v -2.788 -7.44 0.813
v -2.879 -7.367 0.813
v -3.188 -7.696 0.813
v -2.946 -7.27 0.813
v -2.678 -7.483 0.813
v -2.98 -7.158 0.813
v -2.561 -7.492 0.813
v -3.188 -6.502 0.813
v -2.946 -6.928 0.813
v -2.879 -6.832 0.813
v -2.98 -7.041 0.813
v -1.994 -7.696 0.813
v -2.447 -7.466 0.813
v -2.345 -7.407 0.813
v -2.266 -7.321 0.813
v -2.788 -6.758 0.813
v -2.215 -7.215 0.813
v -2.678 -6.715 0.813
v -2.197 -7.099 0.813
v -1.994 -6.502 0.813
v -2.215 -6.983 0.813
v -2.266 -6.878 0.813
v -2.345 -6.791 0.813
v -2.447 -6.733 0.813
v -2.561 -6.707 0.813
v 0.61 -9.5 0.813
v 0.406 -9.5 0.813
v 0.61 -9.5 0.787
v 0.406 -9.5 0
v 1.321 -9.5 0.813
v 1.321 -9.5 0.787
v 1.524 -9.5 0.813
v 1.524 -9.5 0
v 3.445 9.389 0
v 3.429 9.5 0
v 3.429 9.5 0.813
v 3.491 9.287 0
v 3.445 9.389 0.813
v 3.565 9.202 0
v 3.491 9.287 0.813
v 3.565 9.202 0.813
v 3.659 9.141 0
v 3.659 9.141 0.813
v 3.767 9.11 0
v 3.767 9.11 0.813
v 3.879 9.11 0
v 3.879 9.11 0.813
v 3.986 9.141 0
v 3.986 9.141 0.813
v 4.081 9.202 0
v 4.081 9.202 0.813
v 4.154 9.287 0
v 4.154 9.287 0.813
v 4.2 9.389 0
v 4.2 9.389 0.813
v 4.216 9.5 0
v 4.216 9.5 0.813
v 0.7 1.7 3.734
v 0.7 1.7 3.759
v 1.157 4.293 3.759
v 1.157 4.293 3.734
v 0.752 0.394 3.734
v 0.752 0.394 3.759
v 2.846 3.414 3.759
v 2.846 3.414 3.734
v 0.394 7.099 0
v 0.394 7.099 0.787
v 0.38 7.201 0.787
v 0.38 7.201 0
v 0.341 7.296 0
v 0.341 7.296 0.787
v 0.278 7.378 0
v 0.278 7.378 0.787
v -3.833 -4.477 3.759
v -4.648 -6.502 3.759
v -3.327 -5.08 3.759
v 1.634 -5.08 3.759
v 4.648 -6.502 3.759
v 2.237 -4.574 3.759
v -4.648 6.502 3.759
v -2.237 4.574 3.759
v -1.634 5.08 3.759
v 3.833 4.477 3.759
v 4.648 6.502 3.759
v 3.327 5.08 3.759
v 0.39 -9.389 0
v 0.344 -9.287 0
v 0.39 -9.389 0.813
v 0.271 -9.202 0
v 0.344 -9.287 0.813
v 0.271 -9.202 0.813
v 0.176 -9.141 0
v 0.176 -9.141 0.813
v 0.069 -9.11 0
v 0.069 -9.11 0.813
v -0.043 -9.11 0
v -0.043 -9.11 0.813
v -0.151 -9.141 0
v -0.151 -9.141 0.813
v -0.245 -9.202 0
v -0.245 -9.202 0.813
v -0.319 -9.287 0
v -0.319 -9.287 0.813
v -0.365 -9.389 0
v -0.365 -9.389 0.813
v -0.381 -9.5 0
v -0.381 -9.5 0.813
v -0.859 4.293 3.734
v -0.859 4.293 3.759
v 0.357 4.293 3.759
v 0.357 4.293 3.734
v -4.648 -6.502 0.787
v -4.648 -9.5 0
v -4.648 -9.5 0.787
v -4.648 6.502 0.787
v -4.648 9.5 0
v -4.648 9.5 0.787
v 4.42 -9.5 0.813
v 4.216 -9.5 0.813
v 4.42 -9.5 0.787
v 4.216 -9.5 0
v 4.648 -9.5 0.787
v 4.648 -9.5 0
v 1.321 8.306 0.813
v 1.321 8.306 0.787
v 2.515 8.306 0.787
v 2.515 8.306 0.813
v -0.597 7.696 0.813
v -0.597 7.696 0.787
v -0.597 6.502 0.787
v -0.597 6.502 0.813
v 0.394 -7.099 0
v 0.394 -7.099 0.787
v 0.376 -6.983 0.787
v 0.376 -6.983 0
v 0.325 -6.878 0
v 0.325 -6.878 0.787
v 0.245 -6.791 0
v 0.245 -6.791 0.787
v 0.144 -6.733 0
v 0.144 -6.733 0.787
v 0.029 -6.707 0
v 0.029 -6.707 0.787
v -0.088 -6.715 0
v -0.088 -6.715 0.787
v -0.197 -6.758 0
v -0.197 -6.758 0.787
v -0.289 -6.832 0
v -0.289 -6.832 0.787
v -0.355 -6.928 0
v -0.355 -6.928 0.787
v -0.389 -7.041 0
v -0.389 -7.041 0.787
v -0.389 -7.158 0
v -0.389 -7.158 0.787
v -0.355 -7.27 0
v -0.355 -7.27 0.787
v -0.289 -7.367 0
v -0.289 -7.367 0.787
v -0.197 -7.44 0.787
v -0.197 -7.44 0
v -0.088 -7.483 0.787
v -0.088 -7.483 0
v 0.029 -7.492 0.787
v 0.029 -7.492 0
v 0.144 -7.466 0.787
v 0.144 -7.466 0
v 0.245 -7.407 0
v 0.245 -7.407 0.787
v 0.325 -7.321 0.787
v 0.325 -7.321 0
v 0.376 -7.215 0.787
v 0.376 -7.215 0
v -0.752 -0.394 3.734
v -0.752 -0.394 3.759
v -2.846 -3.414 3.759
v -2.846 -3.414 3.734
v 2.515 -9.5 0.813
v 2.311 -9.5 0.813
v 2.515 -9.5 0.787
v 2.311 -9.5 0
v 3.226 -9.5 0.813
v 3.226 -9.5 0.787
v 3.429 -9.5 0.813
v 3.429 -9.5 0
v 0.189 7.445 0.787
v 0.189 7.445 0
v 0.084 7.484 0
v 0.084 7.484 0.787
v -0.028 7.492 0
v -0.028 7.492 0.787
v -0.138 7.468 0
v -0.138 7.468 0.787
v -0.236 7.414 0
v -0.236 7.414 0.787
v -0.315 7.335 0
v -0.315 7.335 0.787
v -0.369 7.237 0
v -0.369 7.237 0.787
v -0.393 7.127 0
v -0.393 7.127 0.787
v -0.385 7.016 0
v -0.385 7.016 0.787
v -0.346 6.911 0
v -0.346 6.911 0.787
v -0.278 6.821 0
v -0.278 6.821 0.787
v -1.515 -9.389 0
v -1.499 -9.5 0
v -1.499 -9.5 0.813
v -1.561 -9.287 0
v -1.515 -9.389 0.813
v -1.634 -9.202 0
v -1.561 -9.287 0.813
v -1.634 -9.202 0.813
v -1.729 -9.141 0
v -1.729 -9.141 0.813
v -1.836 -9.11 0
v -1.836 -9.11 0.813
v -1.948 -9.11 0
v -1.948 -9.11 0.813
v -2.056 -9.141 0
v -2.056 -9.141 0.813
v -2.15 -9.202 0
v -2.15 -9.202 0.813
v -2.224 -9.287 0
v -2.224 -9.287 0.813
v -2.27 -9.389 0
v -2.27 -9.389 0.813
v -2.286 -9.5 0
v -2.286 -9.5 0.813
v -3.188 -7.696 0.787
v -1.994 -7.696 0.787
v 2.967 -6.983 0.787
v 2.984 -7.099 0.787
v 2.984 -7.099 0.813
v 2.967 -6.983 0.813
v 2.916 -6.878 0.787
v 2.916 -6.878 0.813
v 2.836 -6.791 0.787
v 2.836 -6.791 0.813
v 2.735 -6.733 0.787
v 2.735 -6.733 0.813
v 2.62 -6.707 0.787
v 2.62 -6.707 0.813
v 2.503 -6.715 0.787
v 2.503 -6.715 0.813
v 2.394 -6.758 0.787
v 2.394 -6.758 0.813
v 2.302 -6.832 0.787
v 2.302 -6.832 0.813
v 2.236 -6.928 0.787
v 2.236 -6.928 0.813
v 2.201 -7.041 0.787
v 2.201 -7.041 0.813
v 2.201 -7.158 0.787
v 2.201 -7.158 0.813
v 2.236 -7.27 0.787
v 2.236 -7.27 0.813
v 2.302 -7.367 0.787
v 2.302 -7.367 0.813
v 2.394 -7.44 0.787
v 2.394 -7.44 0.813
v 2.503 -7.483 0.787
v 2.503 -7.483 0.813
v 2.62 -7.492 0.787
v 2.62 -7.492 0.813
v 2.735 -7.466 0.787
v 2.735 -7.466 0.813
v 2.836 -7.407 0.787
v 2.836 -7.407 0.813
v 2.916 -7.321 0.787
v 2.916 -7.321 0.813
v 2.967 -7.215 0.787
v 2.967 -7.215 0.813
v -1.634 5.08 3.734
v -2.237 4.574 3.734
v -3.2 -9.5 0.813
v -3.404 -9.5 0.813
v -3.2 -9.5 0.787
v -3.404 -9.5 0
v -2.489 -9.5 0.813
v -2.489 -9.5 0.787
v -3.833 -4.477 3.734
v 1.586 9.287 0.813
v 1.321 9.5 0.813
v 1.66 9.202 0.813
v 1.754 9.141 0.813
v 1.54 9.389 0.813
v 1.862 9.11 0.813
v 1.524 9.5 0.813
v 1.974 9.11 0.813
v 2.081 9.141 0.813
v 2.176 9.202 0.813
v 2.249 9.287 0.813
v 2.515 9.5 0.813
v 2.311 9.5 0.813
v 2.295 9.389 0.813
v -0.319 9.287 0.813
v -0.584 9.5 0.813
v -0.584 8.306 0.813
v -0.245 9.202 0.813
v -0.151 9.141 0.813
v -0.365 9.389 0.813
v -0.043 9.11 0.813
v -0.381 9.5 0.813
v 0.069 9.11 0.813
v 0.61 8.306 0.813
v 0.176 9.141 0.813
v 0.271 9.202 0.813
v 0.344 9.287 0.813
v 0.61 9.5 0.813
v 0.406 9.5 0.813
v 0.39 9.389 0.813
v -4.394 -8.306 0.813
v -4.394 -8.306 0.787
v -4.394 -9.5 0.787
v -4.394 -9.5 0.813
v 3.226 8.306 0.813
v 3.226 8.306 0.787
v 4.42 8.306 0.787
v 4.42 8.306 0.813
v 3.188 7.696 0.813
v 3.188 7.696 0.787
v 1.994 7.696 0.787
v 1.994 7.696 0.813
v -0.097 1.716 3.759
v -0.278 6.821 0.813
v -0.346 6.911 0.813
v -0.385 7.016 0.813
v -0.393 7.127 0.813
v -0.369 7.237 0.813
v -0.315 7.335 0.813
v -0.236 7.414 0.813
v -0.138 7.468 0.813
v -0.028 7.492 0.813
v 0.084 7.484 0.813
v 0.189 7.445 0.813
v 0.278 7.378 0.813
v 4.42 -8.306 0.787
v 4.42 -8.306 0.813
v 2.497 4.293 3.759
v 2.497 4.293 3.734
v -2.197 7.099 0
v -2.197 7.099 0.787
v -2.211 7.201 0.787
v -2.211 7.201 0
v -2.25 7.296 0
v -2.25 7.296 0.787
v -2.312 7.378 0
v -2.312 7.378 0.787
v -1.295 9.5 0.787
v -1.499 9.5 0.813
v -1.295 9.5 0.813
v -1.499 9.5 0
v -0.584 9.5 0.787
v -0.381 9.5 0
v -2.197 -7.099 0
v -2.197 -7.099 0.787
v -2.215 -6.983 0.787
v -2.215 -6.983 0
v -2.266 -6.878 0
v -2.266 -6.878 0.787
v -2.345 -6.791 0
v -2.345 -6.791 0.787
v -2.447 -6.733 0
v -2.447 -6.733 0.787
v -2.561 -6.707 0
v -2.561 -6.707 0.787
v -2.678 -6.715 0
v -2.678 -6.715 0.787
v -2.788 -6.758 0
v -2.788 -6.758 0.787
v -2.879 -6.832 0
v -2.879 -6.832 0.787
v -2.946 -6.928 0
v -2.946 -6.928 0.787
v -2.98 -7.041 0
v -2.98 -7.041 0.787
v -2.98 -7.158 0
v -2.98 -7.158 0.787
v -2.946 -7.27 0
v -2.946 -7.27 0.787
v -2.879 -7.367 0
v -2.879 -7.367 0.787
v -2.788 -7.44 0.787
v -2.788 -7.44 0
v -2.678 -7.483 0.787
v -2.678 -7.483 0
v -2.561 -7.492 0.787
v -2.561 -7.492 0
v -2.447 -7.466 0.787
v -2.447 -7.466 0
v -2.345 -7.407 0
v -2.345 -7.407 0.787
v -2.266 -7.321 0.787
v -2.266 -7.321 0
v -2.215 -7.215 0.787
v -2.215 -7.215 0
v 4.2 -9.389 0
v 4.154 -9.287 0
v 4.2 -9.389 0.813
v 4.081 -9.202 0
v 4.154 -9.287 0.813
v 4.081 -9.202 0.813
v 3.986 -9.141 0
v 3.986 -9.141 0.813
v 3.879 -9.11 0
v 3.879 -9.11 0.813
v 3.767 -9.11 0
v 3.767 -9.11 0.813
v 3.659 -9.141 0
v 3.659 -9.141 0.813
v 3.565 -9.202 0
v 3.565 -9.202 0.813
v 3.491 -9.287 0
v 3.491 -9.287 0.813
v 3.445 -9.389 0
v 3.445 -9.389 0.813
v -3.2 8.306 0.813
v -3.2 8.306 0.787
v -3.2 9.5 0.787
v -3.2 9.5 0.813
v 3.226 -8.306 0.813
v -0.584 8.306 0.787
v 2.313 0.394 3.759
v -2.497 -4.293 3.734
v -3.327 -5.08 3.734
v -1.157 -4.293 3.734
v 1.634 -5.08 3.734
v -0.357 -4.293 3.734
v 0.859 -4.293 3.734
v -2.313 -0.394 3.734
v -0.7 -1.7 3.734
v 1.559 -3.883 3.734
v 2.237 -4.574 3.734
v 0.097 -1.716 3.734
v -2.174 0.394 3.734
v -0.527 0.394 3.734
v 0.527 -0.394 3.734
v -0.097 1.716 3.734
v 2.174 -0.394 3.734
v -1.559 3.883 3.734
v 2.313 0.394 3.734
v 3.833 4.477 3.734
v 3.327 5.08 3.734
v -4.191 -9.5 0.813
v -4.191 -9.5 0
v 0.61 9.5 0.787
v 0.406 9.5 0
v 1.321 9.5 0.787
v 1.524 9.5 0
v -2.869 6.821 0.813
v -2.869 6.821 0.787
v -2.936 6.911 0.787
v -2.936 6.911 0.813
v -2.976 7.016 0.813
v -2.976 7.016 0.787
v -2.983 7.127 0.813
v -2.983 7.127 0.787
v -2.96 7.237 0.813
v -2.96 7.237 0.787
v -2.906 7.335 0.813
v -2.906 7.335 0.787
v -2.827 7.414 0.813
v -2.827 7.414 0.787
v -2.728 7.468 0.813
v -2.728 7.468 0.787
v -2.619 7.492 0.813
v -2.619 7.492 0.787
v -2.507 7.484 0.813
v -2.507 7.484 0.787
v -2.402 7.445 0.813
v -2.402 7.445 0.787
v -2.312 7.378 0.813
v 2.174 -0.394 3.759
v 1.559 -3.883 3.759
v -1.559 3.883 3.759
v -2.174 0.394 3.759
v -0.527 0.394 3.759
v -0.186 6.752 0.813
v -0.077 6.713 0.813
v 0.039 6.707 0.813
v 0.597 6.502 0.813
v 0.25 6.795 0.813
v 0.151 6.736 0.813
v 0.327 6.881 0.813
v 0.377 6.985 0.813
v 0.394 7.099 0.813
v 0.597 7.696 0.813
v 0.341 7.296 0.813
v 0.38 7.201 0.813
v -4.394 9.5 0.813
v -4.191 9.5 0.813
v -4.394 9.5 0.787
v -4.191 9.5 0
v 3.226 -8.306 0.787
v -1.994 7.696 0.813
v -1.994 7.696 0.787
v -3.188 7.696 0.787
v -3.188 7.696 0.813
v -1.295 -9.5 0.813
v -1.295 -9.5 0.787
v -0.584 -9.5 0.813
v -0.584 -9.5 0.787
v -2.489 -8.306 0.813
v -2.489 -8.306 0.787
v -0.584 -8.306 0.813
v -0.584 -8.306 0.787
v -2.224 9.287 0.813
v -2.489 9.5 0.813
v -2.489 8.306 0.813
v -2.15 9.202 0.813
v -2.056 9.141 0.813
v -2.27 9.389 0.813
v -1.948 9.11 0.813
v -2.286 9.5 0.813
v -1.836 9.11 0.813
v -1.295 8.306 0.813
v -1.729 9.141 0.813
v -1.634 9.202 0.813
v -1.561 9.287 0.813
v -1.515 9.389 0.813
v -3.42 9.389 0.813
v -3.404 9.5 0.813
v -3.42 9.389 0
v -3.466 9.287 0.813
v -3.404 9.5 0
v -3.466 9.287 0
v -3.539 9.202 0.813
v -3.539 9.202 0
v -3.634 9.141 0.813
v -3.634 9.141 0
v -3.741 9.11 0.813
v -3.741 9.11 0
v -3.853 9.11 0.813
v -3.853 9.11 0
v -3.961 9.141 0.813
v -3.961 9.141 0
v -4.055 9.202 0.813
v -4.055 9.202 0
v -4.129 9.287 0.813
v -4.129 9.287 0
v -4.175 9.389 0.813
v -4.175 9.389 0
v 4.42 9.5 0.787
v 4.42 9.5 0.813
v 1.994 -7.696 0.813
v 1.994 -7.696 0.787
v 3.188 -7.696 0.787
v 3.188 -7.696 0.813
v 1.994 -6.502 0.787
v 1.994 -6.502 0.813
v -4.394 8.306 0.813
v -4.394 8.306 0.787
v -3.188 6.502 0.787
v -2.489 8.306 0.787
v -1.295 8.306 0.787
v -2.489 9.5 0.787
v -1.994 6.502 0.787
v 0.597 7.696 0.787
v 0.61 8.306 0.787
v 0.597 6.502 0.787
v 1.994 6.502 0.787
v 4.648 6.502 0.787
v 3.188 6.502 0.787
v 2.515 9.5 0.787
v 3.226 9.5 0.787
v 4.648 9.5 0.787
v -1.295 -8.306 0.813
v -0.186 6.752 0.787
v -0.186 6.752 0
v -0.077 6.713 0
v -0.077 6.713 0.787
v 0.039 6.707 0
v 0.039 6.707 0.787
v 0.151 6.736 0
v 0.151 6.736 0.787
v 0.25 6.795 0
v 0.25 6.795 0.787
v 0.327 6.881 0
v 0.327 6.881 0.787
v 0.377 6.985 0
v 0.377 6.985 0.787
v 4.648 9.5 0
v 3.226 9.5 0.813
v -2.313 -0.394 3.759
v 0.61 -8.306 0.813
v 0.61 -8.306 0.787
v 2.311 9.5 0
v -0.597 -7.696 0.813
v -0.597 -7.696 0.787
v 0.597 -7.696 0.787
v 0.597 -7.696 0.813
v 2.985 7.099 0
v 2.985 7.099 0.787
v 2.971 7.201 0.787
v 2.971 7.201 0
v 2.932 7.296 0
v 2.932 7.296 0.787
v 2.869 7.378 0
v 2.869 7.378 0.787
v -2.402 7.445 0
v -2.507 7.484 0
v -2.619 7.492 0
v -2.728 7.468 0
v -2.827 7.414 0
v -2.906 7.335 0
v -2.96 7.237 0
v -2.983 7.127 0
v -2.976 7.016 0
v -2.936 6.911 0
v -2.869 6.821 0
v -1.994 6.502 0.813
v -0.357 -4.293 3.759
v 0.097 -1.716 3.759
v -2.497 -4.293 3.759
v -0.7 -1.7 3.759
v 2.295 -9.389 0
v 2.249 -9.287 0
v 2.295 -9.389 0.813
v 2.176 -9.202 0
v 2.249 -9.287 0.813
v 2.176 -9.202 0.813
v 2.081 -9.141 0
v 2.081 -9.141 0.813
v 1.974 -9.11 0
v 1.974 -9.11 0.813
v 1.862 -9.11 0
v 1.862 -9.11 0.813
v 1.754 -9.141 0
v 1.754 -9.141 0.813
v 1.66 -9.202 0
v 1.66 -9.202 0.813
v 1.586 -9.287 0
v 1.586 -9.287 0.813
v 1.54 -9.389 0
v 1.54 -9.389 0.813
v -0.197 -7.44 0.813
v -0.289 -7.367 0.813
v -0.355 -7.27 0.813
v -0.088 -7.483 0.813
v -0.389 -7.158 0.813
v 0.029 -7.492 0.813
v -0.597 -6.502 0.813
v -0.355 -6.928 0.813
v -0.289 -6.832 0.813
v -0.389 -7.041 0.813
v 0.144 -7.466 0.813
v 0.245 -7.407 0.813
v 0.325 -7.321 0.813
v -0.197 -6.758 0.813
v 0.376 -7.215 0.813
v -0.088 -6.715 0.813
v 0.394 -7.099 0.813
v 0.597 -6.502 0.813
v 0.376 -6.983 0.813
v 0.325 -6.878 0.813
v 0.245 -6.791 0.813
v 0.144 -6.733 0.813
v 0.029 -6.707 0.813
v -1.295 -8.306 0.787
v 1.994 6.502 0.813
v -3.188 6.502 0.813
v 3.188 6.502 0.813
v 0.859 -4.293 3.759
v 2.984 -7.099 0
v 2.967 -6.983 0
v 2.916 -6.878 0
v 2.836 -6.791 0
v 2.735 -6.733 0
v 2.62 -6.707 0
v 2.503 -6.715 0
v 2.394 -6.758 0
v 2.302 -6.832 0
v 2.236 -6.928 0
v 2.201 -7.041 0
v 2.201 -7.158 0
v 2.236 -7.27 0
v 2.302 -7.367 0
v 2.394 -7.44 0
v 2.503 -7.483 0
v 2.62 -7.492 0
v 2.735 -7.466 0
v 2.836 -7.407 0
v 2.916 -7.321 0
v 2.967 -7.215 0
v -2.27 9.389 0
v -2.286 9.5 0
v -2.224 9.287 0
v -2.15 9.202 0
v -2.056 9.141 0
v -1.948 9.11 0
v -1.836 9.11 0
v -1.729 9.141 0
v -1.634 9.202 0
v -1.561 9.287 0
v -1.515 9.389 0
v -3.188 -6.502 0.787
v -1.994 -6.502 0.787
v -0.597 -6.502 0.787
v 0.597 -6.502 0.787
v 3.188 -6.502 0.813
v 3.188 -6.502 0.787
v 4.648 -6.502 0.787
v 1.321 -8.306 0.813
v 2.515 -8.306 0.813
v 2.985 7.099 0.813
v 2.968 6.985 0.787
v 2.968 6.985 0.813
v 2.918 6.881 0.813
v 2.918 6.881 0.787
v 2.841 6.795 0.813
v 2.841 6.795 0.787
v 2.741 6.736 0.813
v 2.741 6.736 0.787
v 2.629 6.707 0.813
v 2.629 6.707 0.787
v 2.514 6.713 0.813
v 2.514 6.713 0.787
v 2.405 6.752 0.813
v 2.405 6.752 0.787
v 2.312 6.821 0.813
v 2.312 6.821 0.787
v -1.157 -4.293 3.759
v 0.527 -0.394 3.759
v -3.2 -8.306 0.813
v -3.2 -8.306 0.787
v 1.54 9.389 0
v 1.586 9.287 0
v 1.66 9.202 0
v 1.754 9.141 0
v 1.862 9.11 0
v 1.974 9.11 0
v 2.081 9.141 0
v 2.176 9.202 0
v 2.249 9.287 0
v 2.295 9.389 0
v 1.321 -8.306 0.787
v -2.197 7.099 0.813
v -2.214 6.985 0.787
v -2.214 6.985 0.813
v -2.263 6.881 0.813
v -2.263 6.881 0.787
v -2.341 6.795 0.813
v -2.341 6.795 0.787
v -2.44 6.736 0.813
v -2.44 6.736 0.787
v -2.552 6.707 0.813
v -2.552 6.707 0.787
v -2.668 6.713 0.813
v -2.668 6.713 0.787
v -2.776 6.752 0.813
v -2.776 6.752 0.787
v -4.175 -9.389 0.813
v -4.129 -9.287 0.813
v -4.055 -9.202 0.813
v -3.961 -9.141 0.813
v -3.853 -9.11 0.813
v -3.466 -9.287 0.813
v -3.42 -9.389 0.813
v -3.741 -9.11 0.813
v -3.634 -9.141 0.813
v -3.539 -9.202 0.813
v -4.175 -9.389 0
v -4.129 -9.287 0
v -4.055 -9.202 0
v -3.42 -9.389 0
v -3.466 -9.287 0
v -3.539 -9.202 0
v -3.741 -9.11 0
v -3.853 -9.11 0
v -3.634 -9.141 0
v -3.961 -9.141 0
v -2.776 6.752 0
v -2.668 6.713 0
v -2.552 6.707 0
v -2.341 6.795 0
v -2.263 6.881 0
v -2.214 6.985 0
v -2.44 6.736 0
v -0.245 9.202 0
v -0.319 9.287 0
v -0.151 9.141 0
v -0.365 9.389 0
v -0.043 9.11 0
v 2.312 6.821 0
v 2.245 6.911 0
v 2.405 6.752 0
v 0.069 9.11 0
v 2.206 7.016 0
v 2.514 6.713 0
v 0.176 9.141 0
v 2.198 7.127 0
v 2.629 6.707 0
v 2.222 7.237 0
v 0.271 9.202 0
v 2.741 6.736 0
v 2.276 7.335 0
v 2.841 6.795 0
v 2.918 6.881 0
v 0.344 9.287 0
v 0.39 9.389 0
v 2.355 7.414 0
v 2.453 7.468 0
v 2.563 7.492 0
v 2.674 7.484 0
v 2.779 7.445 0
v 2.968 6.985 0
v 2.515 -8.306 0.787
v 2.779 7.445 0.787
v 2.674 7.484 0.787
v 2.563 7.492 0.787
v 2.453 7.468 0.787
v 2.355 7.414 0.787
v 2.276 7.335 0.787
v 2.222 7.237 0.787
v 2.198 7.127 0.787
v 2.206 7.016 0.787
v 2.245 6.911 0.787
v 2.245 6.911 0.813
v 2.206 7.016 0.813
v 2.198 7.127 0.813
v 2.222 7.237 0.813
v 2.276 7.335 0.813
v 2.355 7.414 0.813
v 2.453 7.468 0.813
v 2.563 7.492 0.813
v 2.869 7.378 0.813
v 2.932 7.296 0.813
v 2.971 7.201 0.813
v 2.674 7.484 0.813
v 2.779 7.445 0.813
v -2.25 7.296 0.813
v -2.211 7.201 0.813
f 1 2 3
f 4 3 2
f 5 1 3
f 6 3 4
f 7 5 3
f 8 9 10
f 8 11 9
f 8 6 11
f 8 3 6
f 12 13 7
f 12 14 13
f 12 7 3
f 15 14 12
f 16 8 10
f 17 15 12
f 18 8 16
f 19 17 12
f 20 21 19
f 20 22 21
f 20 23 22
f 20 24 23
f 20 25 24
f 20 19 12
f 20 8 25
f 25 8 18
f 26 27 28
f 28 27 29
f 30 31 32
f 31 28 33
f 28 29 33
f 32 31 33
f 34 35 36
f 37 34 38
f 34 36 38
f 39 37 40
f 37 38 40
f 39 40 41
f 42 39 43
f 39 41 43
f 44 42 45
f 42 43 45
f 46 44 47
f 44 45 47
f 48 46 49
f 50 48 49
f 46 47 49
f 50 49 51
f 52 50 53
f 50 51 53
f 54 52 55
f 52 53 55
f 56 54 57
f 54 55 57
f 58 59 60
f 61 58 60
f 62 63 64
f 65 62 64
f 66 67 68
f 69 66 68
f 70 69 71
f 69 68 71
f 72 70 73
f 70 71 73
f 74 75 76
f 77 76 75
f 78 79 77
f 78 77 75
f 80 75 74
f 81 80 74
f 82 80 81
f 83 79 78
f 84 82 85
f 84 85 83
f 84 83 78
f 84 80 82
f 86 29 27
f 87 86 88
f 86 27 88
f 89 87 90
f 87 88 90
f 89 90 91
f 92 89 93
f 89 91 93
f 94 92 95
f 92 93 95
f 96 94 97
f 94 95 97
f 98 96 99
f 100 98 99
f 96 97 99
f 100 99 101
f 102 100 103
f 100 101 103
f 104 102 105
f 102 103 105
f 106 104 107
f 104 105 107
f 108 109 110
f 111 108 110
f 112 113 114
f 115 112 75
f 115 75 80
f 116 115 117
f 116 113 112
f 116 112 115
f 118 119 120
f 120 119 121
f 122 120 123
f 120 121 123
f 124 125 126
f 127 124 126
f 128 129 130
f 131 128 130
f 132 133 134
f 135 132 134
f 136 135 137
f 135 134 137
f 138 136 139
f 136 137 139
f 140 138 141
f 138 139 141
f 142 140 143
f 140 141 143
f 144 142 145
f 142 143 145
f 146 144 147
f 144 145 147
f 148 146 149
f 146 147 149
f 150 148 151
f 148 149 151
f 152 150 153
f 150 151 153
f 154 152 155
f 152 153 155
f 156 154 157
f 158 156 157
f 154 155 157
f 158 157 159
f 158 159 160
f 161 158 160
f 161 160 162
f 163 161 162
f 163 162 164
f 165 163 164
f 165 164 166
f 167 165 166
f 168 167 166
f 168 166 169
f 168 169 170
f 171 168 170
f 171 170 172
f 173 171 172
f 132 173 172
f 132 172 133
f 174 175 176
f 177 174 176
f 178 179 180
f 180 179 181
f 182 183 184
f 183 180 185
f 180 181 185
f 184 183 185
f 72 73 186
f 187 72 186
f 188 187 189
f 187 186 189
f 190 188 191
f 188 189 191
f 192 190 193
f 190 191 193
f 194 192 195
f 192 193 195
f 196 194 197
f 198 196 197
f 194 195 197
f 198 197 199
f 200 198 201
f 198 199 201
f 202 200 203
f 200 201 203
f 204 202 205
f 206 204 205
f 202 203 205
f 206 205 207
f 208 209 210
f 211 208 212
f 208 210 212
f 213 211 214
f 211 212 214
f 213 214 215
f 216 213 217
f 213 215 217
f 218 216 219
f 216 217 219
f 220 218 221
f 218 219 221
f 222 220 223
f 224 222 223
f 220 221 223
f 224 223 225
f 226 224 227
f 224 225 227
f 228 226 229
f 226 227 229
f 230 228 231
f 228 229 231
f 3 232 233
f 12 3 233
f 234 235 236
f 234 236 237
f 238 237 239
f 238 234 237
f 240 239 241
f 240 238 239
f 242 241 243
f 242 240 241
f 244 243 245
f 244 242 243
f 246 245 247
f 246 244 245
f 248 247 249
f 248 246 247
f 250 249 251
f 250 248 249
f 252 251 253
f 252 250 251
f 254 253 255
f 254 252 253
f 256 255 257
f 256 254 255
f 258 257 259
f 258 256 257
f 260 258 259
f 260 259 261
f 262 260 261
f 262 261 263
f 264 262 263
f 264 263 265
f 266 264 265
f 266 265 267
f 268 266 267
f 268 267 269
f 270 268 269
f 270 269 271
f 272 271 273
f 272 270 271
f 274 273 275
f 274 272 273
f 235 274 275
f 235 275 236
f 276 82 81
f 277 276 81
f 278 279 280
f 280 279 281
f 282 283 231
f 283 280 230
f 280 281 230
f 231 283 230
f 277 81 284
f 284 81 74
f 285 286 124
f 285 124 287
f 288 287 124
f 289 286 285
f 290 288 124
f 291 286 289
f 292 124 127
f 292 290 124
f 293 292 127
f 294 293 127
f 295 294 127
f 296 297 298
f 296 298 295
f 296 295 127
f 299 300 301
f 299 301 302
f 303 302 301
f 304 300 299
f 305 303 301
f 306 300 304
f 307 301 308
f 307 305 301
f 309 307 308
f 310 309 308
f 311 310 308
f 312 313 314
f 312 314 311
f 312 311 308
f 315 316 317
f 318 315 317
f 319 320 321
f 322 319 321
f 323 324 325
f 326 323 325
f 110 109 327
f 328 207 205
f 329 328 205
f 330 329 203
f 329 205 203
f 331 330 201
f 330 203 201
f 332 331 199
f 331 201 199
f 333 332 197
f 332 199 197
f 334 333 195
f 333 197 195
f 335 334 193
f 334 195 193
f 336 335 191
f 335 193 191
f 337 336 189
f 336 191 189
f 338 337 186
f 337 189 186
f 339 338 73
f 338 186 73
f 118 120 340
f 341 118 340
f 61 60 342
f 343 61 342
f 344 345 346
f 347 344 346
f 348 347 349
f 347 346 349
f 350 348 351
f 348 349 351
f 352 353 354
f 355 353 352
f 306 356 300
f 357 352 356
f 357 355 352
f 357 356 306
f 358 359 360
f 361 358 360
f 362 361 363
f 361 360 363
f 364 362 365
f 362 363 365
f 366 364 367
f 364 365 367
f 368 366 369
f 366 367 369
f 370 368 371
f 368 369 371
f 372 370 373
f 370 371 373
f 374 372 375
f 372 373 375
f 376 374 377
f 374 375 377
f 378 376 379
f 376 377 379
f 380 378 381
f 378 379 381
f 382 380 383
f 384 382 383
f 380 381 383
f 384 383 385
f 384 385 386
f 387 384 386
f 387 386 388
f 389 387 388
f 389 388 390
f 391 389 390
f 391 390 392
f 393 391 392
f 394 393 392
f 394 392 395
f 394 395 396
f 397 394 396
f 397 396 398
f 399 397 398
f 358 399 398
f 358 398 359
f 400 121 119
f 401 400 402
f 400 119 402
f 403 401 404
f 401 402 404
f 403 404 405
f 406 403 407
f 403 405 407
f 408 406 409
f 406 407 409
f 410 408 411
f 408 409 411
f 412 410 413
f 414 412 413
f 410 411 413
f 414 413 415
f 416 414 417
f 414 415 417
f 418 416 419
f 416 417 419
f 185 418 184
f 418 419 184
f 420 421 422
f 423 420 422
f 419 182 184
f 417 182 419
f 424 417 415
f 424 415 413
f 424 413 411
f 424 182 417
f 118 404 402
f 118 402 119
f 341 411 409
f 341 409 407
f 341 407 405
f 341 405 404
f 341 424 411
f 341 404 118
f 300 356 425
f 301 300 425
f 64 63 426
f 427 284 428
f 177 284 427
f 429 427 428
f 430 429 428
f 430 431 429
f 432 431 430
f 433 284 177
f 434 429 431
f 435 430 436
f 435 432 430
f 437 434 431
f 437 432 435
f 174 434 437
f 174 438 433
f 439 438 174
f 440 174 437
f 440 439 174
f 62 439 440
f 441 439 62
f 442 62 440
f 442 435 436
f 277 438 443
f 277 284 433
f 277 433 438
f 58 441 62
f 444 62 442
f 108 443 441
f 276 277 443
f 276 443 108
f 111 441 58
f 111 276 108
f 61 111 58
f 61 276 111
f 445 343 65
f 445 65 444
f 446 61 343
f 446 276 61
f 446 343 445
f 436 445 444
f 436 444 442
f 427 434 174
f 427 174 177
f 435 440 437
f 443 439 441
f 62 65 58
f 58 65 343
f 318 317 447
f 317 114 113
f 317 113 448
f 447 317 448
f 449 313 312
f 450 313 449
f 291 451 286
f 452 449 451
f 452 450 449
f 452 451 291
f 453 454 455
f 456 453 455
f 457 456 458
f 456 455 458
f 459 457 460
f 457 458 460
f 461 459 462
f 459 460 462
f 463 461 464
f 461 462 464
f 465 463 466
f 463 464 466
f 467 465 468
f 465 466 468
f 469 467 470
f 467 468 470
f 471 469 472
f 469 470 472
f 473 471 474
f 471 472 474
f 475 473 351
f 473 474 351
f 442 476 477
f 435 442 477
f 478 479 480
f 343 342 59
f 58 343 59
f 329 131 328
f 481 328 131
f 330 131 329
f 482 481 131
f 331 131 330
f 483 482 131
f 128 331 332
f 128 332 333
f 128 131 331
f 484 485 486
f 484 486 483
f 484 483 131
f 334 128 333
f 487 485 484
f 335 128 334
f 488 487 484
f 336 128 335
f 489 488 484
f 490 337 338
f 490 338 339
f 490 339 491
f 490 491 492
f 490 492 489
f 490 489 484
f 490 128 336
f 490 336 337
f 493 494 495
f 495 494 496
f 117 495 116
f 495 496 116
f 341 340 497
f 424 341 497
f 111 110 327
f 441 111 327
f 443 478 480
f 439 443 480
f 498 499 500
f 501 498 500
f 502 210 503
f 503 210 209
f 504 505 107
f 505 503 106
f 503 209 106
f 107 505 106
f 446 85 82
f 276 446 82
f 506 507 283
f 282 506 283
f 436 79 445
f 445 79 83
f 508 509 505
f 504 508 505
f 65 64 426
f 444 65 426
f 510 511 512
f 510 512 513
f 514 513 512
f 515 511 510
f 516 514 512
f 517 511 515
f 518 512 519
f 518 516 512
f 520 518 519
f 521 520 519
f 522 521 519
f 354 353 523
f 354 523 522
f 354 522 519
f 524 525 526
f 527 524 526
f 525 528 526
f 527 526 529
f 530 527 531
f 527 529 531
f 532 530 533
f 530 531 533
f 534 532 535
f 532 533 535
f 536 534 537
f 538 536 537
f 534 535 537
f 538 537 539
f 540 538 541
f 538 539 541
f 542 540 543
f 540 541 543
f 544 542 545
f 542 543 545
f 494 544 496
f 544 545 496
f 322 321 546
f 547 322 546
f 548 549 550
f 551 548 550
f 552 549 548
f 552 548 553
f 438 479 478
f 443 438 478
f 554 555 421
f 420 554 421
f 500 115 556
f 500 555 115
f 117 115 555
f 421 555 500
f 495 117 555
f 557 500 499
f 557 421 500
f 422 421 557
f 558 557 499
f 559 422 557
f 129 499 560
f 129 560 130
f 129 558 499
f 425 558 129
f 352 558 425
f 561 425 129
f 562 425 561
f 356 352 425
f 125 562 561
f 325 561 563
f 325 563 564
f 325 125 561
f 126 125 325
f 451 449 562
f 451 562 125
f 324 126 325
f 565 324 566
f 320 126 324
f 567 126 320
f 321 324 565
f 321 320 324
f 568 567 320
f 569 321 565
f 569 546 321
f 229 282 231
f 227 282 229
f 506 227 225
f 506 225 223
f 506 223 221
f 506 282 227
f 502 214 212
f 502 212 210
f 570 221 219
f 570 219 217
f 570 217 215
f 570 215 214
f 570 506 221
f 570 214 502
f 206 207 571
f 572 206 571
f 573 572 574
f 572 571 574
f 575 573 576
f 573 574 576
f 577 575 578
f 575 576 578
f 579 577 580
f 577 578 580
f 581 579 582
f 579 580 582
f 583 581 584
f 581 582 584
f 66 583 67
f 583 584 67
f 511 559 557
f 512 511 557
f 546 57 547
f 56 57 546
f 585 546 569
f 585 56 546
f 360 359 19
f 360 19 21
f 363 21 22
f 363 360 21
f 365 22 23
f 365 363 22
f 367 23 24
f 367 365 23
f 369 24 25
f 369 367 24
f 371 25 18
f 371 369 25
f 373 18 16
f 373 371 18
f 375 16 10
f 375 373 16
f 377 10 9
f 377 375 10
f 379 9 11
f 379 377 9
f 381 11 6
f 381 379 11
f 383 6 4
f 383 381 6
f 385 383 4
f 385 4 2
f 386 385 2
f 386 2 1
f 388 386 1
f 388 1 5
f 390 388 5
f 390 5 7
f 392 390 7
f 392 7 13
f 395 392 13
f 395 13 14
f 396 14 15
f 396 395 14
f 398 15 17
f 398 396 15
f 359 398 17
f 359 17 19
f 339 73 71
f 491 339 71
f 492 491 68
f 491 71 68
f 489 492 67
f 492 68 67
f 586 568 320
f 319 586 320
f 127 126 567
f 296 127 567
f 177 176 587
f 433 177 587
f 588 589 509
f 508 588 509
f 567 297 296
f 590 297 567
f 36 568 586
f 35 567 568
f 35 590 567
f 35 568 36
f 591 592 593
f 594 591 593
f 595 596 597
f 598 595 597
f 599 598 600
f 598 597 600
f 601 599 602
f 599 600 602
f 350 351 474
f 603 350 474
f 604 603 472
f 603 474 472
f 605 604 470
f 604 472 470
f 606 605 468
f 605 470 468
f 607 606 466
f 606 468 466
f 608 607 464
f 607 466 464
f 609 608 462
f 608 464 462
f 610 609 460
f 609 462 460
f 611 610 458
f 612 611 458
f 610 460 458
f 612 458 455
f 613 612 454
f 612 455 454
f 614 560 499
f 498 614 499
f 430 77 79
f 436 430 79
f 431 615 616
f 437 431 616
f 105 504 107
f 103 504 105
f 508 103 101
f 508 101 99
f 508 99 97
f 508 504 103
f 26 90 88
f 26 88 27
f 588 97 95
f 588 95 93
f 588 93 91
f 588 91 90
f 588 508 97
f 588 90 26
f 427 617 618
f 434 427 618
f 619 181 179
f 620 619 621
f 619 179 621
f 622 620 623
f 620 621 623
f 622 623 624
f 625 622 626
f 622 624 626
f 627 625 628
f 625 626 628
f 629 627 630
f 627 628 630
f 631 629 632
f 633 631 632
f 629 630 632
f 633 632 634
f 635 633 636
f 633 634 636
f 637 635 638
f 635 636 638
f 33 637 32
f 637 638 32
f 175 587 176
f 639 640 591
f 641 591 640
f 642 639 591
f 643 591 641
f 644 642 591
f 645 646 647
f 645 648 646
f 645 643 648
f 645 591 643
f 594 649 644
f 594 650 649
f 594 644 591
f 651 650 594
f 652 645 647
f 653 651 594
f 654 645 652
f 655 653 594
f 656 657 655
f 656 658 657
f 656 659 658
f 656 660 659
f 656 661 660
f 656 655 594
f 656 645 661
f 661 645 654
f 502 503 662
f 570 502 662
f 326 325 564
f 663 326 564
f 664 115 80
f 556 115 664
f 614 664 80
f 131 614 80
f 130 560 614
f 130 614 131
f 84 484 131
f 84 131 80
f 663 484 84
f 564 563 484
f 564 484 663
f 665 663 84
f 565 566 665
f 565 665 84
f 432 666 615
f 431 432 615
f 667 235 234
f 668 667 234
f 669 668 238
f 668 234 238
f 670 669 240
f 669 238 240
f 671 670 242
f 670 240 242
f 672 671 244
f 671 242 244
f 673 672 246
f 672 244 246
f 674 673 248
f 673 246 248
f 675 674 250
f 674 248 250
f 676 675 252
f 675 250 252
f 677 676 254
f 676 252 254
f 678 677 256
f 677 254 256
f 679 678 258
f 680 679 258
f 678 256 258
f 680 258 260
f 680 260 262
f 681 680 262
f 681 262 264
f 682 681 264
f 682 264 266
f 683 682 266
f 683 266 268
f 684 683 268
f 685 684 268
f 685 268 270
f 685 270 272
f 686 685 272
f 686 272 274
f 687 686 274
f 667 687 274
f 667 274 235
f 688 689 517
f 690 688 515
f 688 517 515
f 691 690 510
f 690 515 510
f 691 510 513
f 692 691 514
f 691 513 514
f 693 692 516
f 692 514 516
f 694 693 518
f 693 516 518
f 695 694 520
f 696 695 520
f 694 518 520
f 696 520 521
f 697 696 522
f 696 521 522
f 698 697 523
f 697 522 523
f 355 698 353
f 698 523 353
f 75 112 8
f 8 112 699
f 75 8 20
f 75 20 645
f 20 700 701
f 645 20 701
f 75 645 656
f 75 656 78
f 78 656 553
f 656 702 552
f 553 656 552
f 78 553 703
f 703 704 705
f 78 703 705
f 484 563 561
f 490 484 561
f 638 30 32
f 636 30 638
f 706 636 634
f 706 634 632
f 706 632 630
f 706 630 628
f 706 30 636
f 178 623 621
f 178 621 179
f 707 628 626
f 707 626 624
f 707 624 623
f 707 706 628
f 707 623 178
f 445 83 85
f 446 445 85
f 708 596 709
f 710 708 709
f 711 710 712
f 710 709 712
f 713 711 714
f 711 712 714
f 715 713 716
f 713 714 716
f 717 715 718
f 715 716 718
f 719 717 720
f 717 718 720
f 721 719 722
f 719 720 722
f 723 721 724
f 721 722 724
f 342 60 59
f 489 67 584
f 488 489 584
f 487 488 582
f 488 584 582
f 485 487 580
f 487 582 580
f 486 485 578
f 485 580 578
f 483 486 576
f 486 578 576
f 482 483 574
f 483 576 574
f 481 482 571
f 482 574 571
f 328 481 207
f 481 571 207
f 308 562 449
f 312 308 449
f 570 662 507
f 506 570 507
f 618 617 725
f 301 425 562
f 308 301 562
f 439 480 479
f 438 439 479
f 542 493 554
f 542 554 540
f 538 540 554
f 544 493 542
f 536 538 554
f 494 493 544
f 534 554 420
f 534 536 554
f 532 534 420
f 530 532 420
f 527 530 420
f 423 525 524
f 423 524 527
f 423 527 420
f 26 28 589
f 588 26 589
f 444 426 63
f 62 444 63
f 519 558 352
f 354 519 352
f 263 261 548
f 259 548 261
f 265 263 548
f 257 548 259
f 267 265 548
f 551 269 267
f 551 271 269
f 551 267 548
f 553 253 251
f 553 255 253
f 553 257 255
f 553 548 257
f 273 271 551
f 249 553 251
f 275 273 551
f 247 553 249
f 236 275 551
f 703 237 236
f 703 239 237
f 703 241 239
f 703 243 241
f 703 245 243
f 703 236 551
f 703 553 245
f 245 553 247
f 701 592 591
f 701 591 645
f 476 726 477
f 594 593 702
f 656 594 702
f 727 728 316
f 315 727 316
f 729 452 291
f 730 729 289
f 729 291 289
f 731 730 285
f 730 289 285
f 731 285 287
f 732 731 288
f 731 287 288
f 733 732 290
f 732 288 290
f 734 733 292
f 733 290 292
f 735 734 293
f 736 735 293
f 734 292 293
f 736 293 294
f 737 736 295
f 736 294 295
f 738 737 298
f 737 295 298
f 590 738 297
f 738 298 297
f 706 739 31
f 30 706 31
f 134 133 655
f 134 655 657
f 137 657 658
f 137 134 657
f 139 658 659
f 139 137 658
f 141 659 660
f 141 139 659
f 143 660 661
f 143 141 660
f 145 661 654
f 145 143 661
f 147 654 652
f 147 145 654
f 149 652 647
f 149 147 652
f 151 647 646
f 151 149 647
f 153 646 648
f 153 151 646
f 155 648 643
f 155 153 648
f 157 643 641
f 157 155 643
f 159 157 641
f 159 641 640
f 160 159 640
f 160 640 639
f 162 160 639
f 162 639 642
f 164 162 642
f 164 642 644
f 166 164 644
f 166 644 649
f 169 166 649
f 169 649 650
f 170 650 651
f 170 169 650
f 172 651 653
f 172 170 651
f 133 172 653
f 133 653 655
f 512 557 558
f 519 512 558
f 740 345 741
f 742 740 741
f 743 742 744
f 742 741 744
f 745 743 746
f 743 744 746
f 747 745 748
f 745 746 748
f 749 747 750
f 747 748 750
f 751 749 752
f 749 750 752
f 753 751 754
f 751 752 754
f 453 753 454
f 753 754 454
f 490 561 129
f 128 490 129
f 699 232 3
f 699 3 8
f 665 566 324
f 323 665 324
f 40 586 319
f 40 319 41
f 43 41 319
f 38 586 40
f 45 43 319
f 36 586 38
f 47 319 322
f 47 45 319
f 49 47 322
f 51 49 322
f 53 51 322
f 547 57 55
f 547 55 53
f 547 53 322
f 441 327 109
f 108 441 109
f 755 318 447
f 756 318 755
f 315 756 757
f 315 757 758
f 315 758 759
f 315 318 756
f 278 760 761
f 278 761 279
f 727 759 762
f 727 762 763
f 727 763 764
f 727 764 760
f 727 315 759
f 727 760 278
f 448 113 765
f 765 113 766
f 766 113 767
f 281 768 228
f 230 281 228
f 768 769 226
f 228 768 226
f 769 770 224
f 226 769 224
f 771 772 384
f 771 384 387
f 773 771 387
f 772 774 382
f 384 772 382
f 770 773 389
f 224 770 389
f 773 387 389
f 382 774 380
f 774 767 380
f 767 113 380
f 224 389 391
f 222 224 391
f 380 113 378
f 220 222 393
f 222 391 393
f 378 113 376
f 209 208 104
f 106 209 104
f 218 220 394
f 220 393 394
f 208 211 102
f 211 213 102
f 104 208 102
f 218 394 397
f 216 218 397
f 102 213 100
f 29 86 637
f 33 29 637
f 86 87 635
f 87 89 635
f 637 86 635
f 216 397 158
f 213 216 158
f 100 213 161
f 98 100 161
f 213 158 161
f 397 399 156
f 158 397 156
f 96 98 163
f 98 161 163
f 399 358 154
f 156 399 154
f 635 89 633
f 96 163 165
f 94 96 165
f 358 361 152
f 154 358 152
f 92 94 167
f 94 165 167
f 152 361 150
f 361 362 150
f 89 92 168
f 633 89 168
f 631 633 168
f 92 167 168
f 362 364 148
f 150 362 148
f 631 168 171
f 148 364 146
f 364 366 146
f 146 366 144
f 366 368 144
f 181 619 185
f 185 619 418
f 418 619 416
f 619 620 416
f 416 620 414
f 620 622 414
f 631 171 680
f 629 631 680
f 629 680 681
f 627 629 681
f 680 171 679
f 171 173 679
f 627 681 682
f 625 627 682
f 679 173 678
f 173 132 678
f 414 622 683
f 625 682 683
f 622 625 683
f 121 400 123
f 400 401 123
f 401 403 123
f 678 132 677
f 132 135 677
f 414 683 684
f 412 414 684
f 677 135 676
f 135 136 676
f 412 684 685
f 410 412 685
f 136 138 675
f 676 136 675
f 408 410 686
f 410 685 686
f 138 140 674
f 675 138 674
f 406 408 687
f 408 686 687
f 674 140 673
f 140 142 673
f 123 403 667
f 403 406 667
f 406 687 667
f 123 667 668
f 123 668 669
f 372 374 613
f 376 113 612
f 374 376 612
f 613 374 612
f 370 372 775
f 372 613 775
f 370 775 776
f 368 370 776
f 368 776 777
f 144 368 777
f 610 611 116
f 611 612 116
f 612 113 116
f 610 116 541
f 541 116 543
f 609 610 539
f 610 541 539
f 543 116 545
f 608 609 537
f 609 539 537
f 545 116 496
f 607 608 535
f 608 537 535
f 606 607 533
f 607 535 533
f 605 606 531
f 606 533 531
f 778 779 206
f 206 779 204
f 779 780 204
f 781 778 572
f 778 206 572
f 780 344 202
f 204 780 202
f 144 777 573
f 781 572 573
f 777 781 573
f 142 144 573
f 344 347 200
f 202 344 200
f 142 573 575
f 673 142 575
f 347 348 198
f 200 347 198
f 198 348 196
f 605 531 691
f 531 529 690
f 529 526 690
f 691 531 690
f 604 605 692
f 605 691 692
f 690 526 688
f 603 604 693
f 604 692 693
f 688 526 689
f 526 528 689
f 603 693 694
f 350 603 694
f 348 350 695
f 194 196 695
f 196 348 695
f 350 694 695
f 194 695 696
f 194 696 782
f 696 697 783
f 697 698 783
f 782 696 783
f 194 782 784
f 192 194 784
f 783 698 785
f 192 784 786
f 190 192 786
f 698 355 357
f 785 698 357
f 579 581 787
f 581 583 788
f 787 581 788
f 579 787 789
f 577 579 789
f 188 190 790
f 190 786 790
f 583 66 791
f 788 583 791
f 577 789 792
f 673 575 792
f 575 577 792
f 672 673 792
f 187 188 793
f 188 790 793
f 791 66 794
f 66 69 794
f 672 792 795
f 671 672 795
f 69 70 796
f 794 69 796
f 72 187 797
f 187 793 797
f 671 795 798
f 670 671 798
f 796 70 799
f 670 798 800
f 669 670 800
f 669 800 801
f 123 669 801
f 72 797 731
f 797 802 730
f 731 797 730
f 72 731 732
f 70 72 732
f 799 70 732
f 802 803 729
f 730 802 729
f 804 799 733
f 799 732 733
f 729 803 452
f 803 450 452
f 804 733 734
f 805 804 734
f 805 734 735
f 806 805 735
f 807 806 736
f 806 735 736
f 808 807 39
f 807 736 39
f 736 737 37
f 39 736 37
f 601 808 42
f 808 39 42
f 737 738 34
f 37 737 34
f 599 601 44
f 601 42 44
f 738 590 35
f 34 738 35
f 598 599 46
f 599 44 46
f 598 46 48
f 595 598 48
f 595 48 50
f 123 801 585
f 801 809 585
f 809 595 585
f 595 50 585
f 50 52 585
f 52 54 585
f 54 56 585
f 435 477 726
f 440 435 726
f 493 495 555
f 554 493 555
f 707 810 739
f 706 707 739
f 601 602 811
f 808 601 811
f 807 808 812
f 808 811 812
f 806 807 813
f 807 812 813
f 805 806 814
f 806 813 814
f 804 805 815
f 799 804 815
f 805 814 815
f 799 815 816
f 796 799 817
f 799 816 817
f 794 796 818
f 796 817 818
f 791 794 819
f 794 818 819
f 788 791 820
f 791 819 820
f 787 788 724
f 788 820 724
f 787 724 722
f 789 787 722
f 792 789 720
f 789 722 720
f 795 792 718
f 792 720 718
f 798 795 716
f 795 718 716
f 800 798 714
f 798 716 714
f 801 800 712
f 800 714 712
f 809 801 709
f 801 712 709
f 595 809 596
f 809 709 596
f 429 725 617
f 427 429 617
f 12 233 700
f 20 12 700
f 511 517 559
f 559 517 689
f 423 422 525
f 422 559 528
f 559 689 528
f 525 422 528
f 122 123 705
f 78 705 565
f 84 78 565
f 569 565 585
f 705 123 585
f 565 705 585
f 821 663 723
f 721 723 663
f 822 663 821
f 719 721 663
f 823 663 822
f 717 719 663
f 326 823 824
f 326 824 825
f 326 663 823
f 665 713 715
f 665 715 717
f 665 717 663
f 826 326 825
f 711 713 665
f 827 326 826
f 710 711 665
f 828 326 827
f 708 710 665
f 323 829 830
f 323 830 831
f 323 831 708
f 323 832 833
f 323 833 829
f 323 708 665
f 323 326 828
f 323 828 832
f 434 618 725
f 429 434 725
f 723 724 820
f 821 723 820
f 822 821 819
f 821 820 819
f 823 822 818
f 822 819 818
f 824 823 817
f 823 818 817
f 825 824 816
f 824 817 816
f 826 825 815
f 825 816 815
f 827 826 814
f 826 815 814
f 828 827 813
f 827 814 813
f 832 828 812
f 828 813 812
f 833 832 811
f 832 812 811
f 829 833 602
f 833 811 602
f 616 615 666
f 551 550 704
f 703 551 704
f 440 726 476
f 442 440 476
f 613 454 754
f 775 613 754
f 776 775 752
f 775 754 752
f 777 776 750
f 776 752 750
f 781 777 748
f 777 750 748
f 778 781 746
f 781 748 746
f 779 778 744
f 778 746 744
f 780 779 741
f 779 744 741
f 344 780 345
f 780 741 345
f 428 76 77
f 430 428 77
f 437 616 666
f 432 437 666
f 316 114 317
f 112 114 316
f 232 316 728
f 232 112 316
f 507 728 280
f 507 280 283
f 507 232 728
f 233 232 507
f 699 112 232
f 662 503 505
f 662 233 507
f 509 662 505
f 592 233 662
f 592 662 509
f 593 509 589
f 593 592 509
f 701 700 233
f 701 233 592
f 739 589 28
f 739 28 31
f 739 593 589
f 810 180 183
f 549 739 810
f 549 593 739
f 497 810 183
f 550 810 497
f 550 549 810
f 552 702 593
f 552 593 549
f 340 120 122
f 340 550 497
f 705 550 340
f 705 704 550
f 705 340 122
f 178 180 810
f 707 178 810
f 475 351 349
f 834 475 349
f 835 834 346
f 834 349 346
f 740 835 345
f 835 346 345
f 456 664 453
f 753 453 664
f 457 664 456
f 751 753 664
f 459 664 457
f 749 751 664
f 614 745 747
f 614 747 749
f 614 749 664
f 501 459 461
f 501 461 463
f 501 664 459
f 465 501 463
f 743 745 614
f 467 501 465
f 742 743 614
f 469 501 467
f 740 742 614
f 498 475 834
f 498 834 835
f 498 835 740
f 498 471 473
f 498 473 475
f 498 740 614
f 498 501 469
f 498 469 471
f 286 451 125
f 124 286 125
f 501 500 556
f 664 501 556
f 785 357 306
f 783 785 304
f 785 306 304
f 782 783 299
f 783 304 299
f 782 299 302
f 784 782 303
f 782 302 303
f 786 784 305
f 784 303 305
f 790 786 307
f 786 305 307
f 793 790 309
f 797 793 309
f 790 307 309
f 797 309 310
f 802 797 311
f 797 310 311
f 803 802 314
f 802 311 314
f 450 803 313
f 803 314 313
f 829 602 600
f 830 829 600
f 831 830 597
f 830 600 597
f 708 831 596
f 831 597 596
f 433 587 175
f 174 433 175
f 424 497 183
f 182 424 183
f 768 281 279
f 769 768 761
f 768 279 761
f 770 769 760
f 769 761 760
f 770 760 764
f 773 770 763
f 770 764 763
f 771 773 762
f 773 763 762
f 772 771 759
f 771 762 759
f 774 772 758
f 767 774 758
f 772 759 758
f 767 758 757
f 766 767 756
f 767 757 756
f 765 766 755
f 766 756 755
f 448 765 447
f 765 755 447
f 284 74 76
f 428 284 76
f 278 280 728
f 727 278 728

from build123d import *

# Parameters (mm, degrees)
F0_W     = 9.2964
F0_H     = 18.9992
F1_DEPTH = 0.7874
F2_W     = 9.2964
F2_H     = 13.0048
F3_DEPTH = 2.9718
F4_R     = 0.3937
F5_DEPTH = 25.4
F4_W     = 1.1938
F4_H     = 1.1938
F6_DEPTH = 0.0254
F8_DEPTH = 0.0254


with BuildPart() as f1:
    # F0 (on Top) → F1 (new body)
    with BuildSketch(Plane.XY):
        Rectangle(F0_W, F0_H)
    extrude(amount=F1_DEPTH)

    # F2 (on face) → F3 (join)
    with BuildSketch(Plane.XY.offset(0.7874)):
        Rectangle(F2_W, F2_H)
    extrude(amount=F3_DEPTH)

    # F4 (on face) → F5 (cut)
    with BuildSketch(Plane.XY.offset(0.7874)):
        with BuildLine():
            ThreePointArc((-3.4036, -9.4996), (-3.7973, -9.1059), (-4.191, -9.4996))
            Line((-4.191, -9.4996), (-3.4036, -9.4996))
        make_face()
        with BuildLine():
            ThreePointArc((-1.4986, -9.4996), (-1.8923, -9.1059), (-2.286, -9.4996))
            Line((-2.286, -9.4996), (-1.4986, -9.4996))
        make_face()
        with BuildLine():
            ThreePointArc((0.4064, -9.4996), (0.0127, -9.1059), (-0.381, -9.4996))
            Line((-0.381, -9.4996), (0.4064, -9.4996))
        make_face()
        with BuildLine():
            ThreePointArc((2.3114, -9.4996), (1.9177, -9.1059), (1.524, -9.4996))
            Line((1.524, -9.4996), (2.3114, -9.4996))
        make_face()
        with BuildLine():
            Line((3.429, -9.4996), (4.2164, -9.4996))
            ThreePointArc((4.2164, -9.4996), (3.8227, -9.1059), (3.429, -9.4996))
        make_face()
        with Locations((2.5908, -7.0993)):
            Circle(F4_R)
        with Locations((0, -7.0993)):
            Circle(F4_R)
        with Locations((-2.5908, -7.0993)):
            Circle(F4_R)
        with BuildLine():
            ThreePointArc((-2.3124120602, 7.3776879398), (-2.8691879398, 7.3776879398), (-2.8691879398, 6.8209120602))
            Line((-2.8691879398, 6.8209120602), (-2.3124120602, 7.3776879398))
        make_face()
        with BuildLine():
            Line((-2.3124120602, 7.3776879398), (-2.8691879398, 6.8209120602))
            ThreePointArc((-2.8691879398, 6.8209120602), (-2.4401375327, 6.7355686281), (-2.1971, 7.0993))
            ThreePointArc((-2.1971, 7.0993), (-2.2270686281, 7.2499624673), (-2.3124120602, 7.3776879398))
        make_face()
        with BuildLine():
            ThreePointArc((0.2783879398, 7.3776879398), (-0.2783879398, 7.3776879398), (-0.2783879398, 6.8209120602))
            Line((-0.2783879398, 6.8209120602), (0.2783879398, 7.3776879398))
        make_face()
        with BuildLine():
            Line((0.2783879398, 7.3776879398), (-0.2783879398, 6.8209120602))
            ThreePointArc((-0.2783879398, 6.8209120602), (0.1506624673, 6.7355686281), (0.3937, 7.0993))
            ThreePointArc((0.3937, 7.0993), (0.3637313719, 7.2499624673), (0.2783879398, 7.3776879398))
        make_face()
        with BuildLine():
            ThreePointArc((2.8691879398, 7.3776879398), (2.3124120602, 7.3776879398), (2.3124120602, 6.8209120602))
            Line((2.3124120602, 6.8209120602), (2.8691879398, 7.3776879398))
        make_face()
        with BuildLine():
            Line((2.8691879398, 7.3776879398), (2.3124120602, 6.8209120602))
            ThreePointArc((2.3124120602, 6.8209120602), (2.7414624673, 6.7355686281), (2.9845, 7.0993))
            ThreePointArc((2.9845, 7.0993), (2.9545313719, 7.2499624673), (2.8691879398, 7.3776879398))
        make_face()
        with BuildLine():
            ThreePointArc((-4.191, 9.4996), (-3.7973, 9.1059), (-3.4036, 9.4996))
            Line((-3.4036, 9.4996), (-4.191, 9.4996))
        make_face()
        with BuildLine():
            ThreePointArc((-2.286, 9.4996), (-1.8923, 9.1059), (-1.4986, 9.4996))
            Line((-1.4986, 9.4996), (-2.286, 9.4996))
        make_face()
        with BuildLine():
            Line((0.4064, 9.4996), (-0.381, 9.4996))
            ThreePointArc((-0.381, 9.4996), (0.0127, 9.1059), (0.4064, 9.4996))
        make_face()
        with BuildLine():
            Line((2.3114, 9.4996), (1.524, 9.4996))
            ThreePointArc((1.524, 9.4996), (1.9177, 9.1059), (2.3114, 9.4996))
        make_face()
        with BuildLine():
            Line((4.2164, 9.4996), (3.429, 9.4996))
            ThreePointArc((3.429, 9.4996), (3.8227, 9.1059), (4.2164, 9.4996))
        make_face()
    extrude(amount=-F5_DEPTH, mode=Mode.SUBTRACT)

    # F4 (on face) → F6 (join)
    with BuildSketch(Plane.XY.offset(0.7874)):
        with BuildLine():
            Line((-4.3942, 8.3058), (-3.2004, 8.3058))
            Line((-3.2004, 8.3058), (-3.2004, 9.4996))
            Line((-3.2004, 9.4996), (-3.4036, 9.4996))
            ThreePointArc((-3.4036, 9.4996), (-3.7973, 9.1059), (-4.191, 9.4996))
            Line((-4.191, 9.4996), (-4.3942, 9.4996))
            Line((-4.3942, 9.4996), (-4.3942, 8.3058))
        make_face()
        with BuildLine():
            Line((-1.2954, 9.4996), (-1.4986, 9.4996))
            ThreePointArc((-1.4986, 9.4996), (-1.8923, 9.1059), (-2.286, 9.4996))
            Line((-2.286, 9.4996), (-2.4892, 9.4996))
            Line((-2.4892, 9.4996), (-2.4892, 8.3058))
            Line((-2.4892, 8.3058), (-1.2954, 8.3058))
            Line((-1.2954, 8.3058), (-1.2954, 9.4996))
        make_face()
        with BuildLine():
            Line((-0.381, 9.4996), (-0.5842, 9.4996))
            Line((-0.5842, 9.4996), (-0.5842, 8.3058))
            Line((-0.5842, 8.3058), (0.6096, 8.3058))
            Line((0.6096, 8.3058), (0.6096, 9.4996))
            Line((0.6096, 9.4996), (0.4064, 9.4996))
            ThreePointArc((0.4064, 9.4996), (0.0127, 9.1059), (-0.381, 9.4996))
        make_face()
        with BuildLine():
            Line((1.524, 9.4996), (1.3208, 9.4996))
            Line((1.3208, 9.4996), (1.3208, 8.3058))
            Line((1.3208, 8.3058), (2.5146, 8.3058))
            Line((2.5146, 8.3058), (2.5146, 9.4996))
            Line((2.5146, 9.4996), (2.3114, 9.4996))
            ThreePointArc((2.3114, 9.4996), (1.9177, 9.1059), (1.524, 9.4996))
        make_face()
        with BuildLine():
            Line((3.429, 9.4996), (3.2258, 9.4996))
            Line((3.2258, 9.4996), (3.2258, 8.3058))
            Line((3.2258, 8.3058), (4.4196, 8.3058))
            Line((4.4196, 8.3058), (4.4196, 9.4996))
            Line((4.4196, 9.4996), (4.2164, 9.4996))
            ThreePointArc((4.2164, 9.4996), (3.8227, 9.1059), (3.429, 9.4996))
        make_face()
        with BuildLine():
            Line((-2.4892, -8.3058), (-2.4892, -9.4996))
            Line((-2.4892, -9.4996), (-2.286, -9.4996))
            ThreePointArc((-2.286, -9.4996), (-1.8923, -9.1059), (-1.4986, -9.4996))
            Line((-1.4986, -9.4996), (-1.2954, -9.4996))
            Line((-1.2954, -9.4996), (-1.2954, -8.3058))
            Line((-1.2954, -8.3058), (-2.4892, -8.3058))
        make_face()
        with BuildLine():
            Line((-4.3942, -8.3058), (-4.3942, -9.4996))
            Line((-4.3942, -9.4996), (-4.191, -9.4996))
            ThreePointArc((-4.191, -9.4996), (-3.7973, -9.1059), (-3.4036, -9.4996))
            Line((-3.4036, -9.4996), (-3.2004, -9.4996))
            Line((-3.2004, -9.4996), (-3.2004, -8.3058))
            Line((-3.2004, -8.3058), (-4.3942, -8.3058))
        make_face()
        with BuildLine():
            Line((-0.5842, -8.3058), (-0.5842, -9.4996))
            Line((-0.5842, -9.4996), (-0.381, -9.4996))
            ThreePointArc((-0.381, -9.4996), (0.0127, -9.1059), (0.4064, -9.4996))
            Line((0.4064, -9.4996), (0.6096, -9.4996))
            Line((0.6096, -9.4996), (0.6096, -8.3058))
            Line((0.6096, -8.3058), (-0.5842, -8.3058))
        make_face()
        with BuildLine():
            Line((1.3208, -8.3058), (1.3208, -9.4996))
            Line((1.3208, -9.4996), (1.524, -9.4996))
            ThreePointArc((1.524, -9.4996), (1.9177, -9.1059), (2.3114, -9.4996))
            Line((2.3114, -9.4996), (2.5146, -9.4996))
            Line((2.5146, -9.4996), (2.5146, -8.3058))
            Line((2.5146, -8.3058), (1.3208, -8.3058))
        make_face()
        with BuildLine():
            Line((4.2164, -9.4996), (4.4196, -9.4996))
            Line((4.4196, -9.4996), (4.4196, -8.3058))
            Line((4.4196, -8.3058), (3.2258, -8.3058))
            Line((3.2258, -8.3058), (3.2258, -9.4996))
            Line((3.2258, -9.4996), (3.429, -9.4996))
            ThreePointArc((3.429, -9.4996), (3.8227, -9.1059), (4.2164, -9.4996))
        make_face()
        with Locations((2.5908, -7.0993)):
            Rectangle(F4_W, F4_H)
        with Locations((2.5908, -7.0993)):
            Circle(F4_R, mode=Mode.SUBTRACT)
        with Locations((0, -7.0993)):
            Rectangle(F4_W, F4_H)
        with Locations((0, -7.0993)):
            Circle(F4_R, mode=Mode.SUBTRACT)
        with Locations((-2.5908, -7.0993)):
            Rectangle(F4_W, F4_H)
        with Locations((-2.5908, -7.0993)):
            Circle(F4_R, mode=Mode.SUBTRACT)
        with BuildLine():
            Line((-2.8691879398, 6.8209120602), (-3.1877, 6.5024))
            Line((-3.1877, 6.5024), (-1.9939, 6.5024))
            Line((-1.9939, 6.5024), (-1.9939, 7.6962))
            Line((-1.9939, 7.6962), (-2.3124120602, 7.3776879398))
            ThreePointArc((-2.3124120602, 7.3776879398), (-2.2270686281, 7.2499624673), (-2.1971, 7.0993))
            ThreePointArc((-2.1971, 7.0993), (-2.4401375327, 6.7355686281), (-2.8691879398, 6.8209120602))
        make_face()
        with BuildLine():
            Line((0.5969, 7.6962), (-0.5969, 7.6962))
            Line((-0.5969, 7.6962), (-0.5969, 6.5024))
            Line((-0.5969, 6.5024), (-0.2783879398, 6.8209120602))
            ThreePointArc((-0.2783879398, 6.8209120602), (-0.2783879398, 7.3776879398), (0.2783879398, 7.3776879398))
            Line((0.2783879398, 7.3776879398), (0.5969, 7.6962))
        make_face()
        with BuildLine():
            Line((-0.2783879398, 6.8209120602), (-0.5969, 6.5024))
            Line((-0.5969, 6.5024), (0.5969, 6.5024))
            Line((0.5969, 6.5024), (0.5969, 7.6962))
            Line((0.5969, 7.6962), (0.2783879398, 7.3776879398))
            ThreePointArc((0.2783879398, 7.3776879398), (0.3637313719, 7.2499624673), (0.3937, 7.0993))
            ThreePointArc((0.3937, 7.0993), (0.1506624673, 6.7355686281), (-0.2783879398, 6.8209120602))
        make_face()
        with BuildLine():
            Line((2.3124120602, 6.8209120602), (1.9939, 6.5024))
            Line((1.9939, 6.5024), (3.1877, 6.5024))
            Line((3.1877, 6.5024), (3.1877, 7.6962))
            Line((3.1877, 7.6962), (2.8691879398, 7.3776879398))
            ThreePointArc((2.8691879398, 7.3776879398), (2.9545313719, 7.2499624673), (2.9845, 7.0993))
            ThreePointArc((2.9845, 7.0993), (2.7414624673, 6.7355686281), (2.3124120602, 6.8209120602))
        make_face()
        with BuildLine():
            Line((-3.1877, 7.6962), (-3.1877, 6.5024))
            Line((-3.1877, 6.5024), (-2.8691879398, 6.8209120602))
            ThreePointArc((-2.8691879398, 6.8209120602), (-2.8691879398, 7.3776879398), (-2.3124120602, 7.3776879398))
            Line((-2.3124120602, 7.3776879398), (-1.9939, 7.6962))
            Line((-1.9939, 7.6962), (-3.1877, 7.6962))
        make_face()
        with BuildLine():
            Line((1.9939, 7.6962), (1.9939, 6.5024))
            Line((1.9939, 6.5024), (2.3124120602, 6.8209120602))
            ThreePointArc((2.3124120602, 6.8209120602), (2.3124120602, 7.3776879398), (2.8691879398, 7.3776879398))
            Line((2.8691879398, 7.3776879398), (3.1877, 7.6962))
            Line((3.1877, 7.6962), (1.9939, 7.6962))
        make_face()
    extrude(amount=F6_DEPTH)

    # F7 (on face) → F8 (cut)
    with BuildSketch(Plane.XY.offset(3.7592)):
        Polygon((-1.6337567293, 5.08), (-2.2369401238, 4.5738690361), (-3.8328201964, -4.4768166055), (-3.3266892325, -5.08), (1.6337567293, -5.08), (2.2369401238, -4.5738690361), (3.8328201964, 4.4768166055), (3.3266892325, 5.08), align=None)
        Polygon((-0.6995260408, -1.6999813781), (-1.1566746545, -4.2926), (-2.496976666, -4.2926), align=None, mode=Mode.SUBTRACT)
        Polygon((-0.7520136768, -0.3937), (-2.8458346333, -3.4137992041), (-2.3133096593, -0.3937), align=None, mode=Mode.SUBTRACT)
        Polygon((0.097116606, -1.716452297), (0.8590653228, -4.2926), (-0.3571277403, -4.2926), align=None, mode=Mode.SUBTRACT)
        Polygon((2.1744697946, -0.3937), (1.5591465579, -3.8833714858), (0.5270043762, -0.3937), align=None, mode=Mode.SUBTRACT)
        Polygon((-2.1744697946, 0.3937), (-1.5591465579, 3.8833714858), (-0.5270043762, 0.3937), align=None, mode=Mode.SUBTRACT)
        Polygon((-0.8590653228, 4.2926), (0.3571277403, 4.2926), (-0.097116606, 1.716452297), align=None, mode=Mode.SUBTRACT)
        Polygon((2.8458346333, 3.4137992041), (2.3133096593, 0.3937), (0.7520136768, 0.3937), align=None, mode=Mode.SUBTRACT)
        Polygon((1.1566746545, 4.2926), (2.496976666, 4.2926), (0.6995260408, 1.6999813781), align=None, mode=Mode.SUBTRACT)
    extrude(amount=-F8_DEPTH, mode=Mode.SUBTRACT)


solid = f1.part
